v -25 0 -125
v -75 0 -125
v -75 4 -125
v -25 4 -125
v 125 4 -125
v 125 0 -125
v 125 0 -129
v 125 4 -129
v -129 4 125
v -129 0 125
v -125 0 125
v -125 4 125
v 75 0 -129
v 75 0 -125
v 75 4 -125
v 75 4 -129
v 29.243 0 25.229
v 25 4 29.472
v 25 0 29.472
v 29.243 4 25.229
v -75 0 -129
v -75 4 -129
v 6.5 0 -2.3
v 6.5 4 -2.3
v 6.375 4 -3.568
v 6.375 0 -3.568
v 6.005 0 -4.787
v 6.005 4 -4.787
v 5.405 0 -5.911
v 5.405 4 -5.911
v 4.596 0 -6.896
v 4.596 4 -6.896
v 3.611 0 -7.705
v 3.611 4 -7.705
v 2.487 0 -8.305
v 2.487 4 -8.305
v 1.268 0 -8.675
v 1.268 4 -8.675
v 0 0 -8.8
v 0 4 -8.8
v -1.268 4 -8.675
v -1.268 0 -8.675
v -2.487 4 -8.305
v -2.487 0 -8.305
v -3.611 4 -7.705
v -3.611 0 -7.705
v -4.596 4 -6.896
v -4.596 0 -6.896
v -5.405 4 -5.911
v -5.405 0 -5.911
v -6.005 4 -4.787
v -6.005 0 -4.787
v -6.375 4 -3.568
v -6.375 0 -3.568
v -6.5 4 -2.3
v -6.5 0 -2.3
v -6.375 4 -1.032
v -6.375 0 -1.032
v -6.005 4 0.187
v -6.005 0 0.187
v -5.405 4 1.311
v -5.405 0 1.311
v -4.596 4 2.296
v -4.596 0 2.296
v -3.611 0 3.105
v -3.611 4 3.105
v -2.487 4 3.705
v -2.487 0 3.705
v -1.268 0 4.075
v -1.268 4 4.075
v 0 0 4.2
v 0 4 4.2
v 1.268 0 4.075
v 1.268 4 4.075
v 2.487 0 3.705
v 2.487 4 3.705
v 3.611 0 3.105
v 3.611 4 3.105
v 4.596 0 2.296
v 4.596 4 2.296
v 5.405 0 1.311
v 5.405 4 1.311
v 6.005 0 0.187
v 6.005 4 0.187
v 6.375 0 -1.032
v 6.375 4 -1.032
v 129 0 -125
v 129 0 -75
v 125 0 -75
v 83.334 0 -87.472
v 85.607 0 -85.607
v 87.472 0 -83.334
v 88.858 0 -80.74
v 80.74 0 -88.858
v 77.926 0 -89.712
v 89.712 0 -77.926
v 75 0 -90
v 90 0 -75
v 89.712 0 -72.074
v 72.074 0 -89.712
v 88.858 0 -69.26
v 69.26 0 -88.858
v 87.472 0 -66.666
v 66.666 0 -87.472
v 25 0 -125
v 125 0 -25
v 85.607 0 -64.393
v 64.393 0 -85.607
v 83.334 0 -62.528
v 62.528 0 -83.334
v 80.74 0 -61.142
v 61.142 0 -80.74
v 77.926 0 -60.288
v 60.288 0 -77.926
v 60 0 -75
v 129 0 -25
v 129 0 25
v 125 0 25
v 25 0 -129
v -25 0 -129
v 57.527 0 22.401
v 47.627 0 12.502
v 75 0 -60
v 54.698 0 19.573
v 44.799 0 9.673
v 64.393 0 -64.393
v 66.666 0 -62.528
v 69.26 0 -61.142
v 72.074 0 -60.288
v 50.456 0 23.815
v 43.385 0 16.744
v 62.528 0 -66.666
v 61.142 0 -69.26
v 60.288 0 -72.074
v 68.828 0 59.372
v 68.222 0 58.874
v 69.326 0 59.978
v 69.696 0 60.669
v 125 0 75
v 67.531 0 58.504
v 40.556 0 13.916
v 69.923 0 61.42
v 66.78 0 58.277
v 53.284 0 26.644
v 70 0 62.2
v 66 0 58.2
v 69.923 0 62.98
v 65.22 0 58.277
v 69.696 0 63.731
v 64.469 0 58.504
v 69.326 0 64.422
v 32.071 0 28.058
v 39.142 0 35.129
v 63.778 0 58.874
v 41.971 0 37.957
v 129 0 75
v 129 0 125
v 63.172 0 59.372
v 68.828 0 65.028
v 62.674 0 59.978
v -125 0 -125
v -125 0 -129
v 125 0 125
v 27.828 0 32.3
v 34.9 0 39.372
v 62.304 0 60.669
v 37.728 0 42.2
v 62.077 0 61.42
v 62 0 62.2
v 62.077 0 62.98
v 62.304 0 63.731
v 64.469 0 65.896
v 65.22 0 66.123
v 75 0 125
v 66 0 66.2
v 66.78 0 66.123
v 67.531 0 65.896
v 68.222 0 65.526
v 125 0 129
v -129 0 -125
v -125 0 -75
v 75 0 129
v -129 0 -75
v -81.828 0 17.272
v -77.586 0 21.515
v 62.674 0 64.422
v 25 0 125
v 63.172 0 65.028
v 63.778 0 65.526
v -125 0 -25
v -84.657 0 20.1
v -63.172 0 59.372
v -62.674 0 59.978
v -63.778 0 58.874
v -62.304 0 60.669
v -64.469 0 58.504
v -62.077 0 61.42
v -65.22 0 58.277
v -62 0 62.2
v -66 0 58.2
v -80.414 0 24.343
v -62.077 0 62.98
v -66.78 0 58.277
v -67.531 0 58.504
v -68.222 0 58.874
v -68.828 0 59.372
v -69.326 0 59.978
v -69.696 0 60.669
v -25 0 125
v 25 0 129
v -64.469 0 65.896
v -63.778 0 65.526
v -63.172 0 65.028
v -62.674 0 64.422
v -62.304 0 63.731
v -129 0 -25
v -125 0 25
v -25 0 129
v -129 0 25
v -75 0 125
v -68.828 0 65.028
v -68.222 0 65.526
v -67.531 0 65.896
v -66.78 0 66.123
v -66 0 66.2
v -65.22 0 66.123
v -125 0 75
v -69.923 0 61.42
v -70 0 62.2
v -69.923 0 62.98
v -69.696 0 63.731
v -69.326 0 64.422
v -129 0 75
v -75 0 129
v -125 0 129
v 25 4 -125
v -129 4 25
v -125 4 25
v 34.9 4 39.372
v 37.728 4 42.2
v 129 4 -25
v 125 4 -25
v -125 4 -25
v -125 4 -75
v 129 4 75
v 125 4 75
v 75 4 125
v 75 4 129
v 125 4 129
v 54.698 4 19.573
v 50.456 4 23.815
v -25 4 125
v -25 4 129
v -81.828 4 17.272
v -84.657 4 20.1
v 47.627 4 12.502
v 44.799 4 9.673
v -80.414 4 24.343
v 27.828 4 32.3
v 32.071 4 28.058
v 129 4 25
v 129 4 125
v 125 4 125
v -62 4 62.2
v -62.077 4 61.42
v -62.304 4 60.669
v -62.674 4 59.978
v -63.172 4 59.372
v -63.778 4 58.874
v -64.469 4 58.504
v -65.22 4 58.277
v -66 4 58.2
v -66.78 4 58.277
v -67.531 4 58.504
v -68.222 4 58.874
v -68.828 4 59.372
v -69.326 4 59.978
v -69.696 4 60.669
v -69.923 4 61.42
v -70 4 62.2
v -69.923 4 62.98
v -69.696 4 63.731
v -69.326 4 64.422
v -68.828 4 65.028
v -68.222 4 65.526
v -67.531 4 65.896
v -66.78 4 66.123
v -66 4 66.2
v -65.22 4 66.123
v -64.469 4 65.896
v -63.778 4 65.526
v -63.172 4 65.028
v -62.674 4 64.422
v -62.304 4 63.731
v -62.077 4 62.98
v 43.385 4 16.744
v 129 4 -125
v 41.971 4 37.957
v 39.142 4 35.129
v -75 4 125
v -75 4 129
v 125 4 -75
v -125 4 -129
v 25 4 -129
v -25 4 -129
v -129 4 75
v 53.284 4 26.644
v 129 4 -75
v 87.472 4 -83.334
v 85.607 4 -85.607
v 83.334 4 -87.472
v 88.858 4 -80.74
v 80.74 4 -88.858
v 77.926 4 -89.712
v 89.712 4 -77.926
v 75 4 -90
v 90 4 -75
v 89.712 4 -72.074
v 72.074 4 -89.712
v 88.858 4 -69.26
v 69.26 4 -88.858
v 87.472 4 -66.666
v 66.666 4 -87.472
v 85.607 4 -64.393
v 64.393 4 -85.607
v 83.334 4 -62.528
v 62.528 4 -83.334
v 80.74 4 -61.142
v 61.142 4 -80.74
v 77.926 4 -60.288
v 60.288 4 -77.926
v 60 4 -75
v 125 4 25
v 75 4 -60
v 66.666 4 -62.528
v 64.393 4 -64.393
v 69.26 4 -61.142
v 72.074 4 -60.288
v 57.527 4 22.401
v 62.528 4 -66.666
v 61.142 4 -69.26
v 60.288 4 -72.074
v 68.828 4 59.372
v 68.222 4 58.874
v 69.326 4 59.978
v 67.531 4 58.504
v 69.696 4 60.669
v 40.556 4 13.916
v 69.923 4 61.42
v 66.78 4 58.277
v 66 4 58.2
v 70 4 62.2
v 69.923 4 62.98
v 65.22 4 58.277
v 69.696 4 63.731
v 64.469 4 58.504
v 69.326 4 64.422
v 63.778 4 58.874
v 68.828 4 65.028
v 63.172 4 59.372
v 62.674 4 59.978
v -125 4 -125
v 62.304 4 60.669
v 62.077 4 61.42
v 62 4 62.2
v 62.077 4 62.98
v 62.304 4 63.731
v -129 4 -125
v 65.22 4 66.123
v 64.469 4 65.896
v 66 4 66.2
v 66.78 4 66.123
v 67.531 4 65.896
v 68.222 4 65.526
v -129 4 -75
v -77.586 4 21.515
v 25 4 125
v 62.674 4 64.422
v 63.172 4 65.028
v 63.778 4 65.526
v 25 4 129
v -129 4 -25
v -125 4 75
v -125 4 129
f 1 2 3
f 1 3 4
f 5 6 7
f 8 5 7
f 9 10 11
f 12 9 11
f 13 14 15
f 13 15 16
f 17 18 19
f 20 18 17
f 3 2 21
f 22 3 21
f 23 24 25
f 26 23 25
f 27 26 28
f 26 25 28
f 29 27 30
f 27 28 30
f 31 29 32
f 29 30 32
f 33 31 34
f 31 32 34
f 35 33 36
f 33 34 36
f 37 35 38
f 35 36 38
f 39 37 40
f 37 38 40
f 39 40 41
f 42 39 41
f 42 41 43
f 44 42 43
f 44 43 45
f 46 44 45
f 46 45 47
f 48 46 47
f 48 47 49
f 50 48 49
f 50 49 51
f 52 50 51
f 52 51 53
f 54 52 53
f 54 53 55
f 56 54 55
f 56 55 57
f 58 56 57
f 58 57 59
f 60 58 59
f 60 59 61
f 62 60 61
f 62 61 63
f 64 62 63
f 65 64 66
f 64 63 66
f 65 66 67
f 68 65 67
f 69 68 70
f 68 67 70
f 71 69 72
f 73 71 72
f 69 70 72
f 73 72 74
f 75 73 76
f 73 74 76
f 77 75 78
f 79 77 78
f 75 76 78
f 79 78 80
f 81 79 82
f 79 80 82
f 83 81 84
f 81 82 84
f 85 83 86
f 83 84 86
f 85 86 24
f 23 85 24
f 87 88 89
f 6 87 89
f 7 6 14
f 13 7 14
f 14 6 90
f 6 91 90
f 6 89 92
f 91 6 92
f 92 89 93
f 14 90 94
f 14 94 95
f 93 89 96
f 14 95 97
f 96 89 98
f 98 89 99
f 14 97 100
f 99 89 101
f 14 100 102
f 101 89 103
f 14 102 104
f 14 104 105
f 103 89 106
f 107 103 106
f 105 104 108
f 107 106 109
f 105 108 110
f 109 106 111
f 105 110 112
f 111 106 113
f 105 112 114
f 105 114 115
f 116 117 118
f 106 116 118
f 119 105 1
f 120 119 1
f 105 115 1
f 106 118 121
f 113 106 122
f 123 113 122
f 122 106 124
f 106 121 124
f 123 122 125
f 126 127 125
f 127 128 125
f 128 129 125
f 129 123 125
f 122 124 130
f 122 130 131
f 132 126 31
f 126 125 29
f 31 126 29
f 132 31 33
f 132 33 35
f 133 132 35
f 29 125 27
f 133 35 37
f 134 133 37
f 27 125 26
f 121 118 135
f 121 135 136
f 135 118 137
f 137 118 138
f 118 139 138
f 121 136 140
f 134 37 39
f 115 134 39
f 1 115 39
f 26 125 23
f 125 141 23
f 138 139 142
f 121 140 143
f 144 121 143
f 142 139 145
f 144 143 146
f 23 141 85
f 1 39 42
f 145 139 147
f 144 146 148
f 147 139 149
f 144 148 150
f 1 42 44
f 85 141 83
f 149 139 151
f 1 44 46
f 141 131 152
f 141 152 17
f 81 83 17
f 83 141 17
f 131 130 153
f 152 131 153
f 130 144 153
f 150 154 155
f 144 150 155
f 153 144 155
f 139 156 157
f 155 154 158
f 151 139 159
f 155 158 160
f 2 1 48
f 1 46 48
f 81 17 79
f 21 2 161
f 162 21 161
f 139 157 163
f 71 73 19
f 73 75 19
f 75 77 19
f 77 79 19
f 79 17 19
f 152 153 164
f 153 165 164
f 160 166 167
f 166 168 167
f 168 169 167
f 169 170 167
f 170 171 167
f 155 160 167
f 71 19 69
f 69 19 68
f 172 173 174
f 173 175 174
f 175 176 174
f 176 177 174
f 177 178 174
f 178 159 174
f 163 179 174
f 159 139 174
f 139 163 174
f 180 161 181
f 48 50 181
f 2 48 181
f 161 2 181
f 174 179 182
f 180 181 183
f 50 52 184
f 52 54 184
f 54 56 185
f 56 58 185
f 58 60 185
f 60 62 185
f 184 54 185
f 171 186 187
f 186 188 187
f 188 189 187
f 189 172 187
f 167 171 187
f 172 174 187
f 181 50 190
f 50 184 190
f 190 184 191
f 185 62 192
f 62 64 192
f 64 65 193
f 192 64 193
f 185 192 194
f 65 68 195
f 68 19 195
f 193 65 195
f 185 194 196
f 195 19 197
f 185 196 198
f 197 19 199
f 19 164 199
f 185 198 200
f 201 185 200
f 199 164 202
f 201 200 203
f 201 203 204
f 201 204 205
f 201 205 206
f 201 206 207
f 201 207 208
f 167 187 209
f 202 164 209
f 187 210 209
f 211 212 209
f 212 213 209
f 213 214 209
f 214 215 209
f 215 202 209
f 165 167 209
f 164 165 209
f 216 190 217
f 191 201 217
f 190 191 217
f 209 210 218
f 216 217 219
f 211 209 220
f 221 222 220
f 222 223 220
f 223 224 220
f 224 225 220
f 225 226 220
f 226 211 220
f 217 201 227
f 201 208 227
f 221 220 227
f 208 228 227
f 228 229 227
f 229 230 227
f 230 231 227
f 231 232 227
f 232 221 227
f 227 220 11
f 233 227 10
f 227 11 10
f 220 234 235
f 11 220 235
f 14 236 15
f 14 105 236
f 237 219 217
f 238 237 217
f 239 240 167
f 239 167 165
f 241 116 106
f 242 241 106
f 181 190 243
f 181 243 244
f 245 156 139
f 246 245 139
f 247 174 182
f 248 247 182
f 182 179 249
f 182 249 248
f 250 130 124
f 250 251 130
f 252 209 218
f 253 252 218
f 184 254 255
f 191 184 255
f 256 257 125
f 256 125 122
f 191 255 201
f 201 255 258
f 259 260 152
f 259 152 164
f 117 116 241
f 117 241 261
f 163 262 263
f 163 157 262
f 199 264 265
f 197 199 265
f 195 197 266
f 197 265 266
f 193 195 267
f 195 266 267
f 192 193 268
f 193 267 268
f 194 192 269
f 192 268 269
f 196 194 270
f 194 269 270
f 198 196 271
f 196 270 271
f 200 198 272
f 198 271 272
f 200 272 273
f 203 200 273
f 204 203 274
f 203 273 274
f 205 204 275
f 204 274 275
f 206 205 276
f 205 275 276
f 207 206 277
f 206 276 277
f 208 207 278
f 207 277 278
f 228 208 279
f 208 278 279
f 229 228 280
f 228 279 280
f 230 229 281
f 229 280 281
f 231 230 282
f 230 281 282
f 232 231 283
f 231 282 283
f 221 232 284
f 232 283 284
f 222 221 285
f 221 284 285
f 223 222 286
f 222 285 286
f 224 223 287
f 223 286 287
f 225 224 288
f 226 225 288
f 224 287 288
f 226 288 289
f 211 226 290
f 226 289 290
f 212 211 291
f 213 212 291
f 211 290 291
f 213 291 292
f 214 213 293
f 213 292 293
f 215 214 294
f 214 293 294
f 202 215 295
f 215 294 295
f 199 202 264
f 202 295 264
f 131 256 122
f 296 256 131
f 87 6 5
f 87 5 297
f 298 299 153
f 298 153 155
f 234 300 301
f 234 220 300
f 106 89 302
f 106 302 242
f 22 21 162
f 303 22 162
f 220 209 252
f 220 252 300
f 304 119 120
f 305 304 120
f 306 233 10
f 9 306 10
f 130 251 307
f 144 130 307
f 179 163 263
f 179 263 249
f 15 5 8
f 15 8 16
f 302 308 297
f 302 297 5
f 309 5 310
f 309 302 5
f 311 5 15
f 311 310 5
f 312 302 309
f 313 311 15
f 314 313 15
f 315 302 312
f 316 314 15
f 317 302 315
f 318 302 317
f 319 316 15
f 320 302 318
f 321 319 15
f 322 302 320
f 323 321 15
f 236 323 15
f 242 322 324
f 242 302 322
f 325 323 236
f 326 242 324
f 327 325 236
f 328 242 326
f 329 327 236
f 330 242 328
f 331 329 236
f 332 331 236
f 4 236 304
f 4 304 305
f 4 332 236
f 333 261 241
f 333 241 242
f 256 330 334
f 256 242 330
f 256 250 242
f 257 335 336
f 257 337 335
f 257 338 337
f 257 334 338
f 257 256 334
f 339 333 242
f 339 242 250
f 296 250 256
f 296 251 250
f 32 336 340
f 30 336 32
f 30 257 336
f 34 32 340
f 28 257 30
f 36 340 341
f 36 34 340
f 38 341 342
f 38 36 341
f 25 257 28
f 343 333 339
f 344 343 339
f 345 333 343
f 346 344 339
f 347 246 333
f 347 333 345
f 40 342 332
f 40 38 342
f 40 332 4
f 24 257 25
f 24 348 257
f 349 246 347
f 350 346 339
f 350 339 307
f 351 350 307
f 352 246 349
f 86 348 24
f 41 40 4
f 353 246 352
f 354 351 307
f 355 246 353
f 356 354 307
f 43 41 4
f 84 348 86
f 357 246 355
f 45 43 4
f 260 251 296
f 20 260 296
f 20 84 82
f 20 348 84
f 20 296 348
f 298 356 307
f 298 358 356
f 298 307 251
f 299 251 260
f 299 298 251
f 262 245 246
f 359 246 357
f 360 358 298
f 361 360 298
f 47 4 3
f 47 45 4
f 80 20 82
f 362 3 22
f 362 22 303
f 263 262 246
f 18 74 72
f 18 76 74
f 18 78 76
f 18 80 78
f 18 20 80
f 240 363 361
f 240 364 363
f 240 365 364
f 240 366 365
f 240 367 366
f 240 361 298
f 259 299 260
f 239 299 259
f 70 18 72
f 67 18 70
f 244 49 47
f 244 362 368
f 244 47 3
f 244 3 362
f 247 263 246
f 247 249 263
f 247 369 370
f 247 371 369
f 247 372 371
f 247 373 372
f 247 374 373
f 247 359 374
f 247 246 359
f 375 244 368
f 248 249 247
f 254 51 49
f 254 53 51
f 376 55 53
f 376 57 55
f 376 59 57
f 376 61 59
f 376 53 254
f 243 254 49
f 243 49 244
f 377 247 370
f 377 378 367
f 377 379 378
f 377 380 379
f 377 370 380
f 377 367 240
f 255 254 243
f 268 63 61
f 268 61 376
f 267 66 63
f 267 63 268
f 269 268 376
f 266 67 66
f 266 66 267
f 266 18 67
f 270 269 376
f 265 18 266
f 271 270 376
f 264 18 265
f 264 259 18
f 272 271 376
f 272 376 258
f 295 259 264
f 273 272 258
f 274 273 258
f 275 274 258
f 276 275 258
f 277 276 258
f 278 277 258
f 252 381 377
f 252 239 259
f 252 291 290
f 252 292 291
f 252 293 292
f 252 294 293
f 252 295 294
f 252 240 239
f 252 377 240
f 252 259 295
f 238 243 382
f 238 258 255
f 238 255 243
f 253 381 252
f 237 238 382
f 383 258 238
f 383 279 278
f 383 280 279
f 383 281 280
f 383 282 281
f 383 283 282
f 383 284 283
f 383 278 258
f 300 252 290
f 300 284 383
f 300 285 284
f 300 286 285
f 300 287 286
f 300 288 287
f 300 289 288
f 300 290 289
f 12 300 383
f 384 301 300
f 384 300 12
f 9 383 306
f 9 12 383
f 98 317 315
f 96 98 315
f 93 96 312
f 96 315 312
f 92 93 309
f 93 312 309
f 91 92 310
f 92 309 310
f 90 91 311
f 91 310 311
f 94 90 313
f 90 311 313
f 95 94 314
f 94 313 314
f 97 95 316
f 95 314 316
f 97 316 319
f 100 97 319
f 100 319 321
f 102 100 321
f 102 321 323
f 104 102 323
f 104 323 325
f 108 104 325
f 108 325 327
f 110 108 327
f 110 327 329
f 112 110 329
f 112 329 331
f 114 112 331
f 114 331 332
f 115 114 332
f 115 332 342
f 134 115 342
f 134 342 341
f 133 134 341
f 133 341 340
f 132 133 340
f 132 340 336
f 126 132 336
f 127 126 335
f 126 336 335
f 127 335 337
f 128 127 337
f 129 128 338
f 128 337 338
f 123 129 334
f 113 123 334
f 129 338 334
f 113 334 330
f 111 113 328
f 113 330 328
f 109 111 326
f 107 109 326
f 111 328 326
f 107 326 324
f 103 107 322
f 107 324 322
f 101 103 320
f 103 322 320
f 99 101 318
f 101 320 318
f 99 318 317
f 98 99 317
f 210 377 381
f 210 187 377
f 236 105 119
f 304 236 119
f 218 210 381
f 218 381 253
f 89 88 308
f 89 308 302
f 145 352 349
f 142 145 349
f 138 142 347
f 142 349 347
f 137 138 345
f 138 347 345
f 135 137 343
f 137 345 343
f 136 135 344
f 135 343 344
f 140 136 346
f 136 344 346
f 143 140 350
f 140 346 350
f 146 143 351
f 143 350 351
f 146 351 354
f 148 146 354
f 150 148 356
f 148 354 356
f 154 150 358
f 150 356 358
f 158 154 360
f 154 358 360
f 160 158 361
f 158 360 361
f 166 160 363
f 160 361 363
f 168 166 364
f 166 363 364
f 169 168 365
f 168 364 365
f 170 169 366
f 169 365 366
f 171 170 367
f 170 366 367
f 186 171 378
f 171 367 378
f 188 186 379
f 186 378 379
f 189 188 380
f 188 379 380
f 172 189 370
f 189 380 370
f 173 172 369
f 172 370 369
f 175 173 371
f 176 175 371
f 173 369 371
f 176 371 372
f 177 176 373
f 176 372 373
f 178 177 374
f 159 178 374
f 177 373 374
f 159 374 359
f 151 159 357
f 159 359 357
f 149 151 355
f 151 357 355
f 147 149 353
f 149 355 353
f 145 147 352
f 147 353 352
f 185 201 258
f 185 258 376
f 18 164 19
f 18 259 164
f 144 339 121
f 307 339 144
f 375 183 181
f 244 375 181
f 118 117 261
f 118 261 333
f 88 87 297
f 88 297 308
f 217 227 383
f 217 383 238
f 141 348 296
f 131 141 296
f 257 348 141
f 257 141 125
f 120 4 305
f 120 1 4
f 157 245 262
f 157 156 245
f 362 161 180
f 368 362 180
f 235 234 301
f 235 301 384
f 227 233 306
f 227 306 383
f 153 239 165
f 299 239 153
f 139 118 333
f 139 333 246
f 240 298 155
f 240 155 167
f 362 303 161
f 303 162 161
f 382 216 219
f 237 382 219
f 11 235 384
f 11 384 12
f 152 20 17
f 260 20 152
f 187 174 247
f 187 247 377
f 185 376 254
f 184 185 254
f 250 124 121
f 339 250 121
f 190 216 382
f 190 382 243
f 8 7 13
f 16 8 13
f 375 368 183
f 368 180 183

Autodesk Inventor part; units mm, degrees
ref_plane "YZ Plane" through (0, 0, 0) normal (1, 0, 0) x (0, 1, 0)
ref_plane "XZ Plane" through (0, 0, 0) normal (0, 1, 0) x (-1, 0, 0)
ref_plane "XY Plane" through (0, 0, 0) normal (0, 0, 1) x (1, 0, 0)
sketch "Sketch1" plane through (0, 0, 0) normal (0, 1, 0) x (-1, 0, 0)
  line L0 (-125, 125) -> (125, 125)
  line L1 (125, 125) -> (125, -125)
  line L2 (125, -125) -> (-125, -125)
  line L3 (-125, -125) -> (-125, 125)
  line L4 (-125, 125) -> (125, -125) construction
  line L5 (125, 125) -> (-125, -125) construction
  line L6 (125, -125) -> (75, -125)
  line L7 (75, -125) -> (75, -129)
  line L8 (75, -129) -> (125, -129)
  line L9 (125, -129) -> (125, -125)
  line L10 (125, -125) -> (129, -125)
  line L11 (129, -125) -> (129, -75)
  line L12 (129, -75) -> (125, -75)
  line L13 (125, -75) -> (125, -125)
  line L14 (-125, -125) -> (-129, -125)
  line L15 (-129, -125) -> (-129, -75)
  line L16 (-129, -75) -> (-125, -75)
  line L17 (-125, -75) -> (-125, -125)
  line L18 (125, 125) -> (75, 125)
  line L19 (75, 125) -> (75, 129)
  line L20 (75, 129) -> (125, 129)
  line L21 (125, 129) -> (125, 125)
  line L22 (75, -129) -> (75, -125)
  line L23 (75, -125) -> (25, -125)
  line L24 (25, -125) -> (25, -129)
  line L25 (25, -129) -> (75, -129)
  line L26 (25, -129) -> (25, -125)
  line L27 (25, -125) -> (-25, -125)
  line L28 (-25, -125) -> (-25, -129)
  line L29 (-25, -129) -> (25, -129)
  line L30 (-25, -129) -> (-25, -125)
  line L31 (-25, -125) -> (-75, -125)
  line L32 (-75, -125) -> (-75, -129)
  line L33 (-75, -129) -> (-25, -129)
  line L34 (-75, -129) -> (-75, -125)
  line L35 (-75, -125) -> (-125, -125)
  line L36 (-125, -125) -> (-125, -129)
  line L37 (-125, -129) -> (-75, -129)
  line L38 (125, -75) -> (129, -75)
  line L39 (125, -25) -> (125, -75)
  line L40 (129, -25) -> (125, -25)
  line L41 (129, -75) -> (129, -25)
  line L42 (125, -25) -> (129, -25)
  line L43 (125, 25) -> (125, -25)
  line L44 (129, 25) -> (125, 25)
  line L45 (129, -25) -> (129, 25)
  line L46 (125, 25) -> (129, 25)
  line L47 (125, 75) -> (125, 25)
  line L48 (129, 75) -> (125, 75)
  line L49 (129, 25) -> (129, 75)
  line L50 (125, 75) -> (129, 75)
  line L51 (125, 125) -> (125, 75)
  line L52 (129, 125) -> (125, 125)
  line L53 (129, 75) -> (129, 125)
  line L54 (-125, -75) -> (-129, -75)
  line L55 (-129, -75) -> (-129, -25)
  line L56 (-129, -25) -> (-125, -25)
  line L57 (-125, -25) -> (-125, -75)
  line L58 (-125, -25) -> (-129, -25)
  line L59 (-129, -25) -> (-129, 25)
  line L60 (-129, 25) -> (-125, 25)
  line L61 (-125, 25) -> (-125, -25)
  line L62 (-125, 25) -> (-129, 25)
  line L63 (-129, 25) -> (-129, 75)
  line L64 (-129, 75) -> (-125, 75)
  line L65 (-125, 75) -> (-125, 25)
  line L66 (-125, 75) -> (-129, 75)
  line L67 (-129, 75) -> (-129, 125)
  line L68 (-129, 125) -> (-125, 125)
  line L69 (-125, 125) -> (-125, 75)
  line L70 (75, 125) -> (25, 125)
  line L71 (25, 125) -> (25, 129)
  line L72 (25, 129) -> (75, 129)
  line L73 (75, 129) -> (75, 125)
  line L74 (25, 125) -> (-25, 125)
  line L75 (-25, 125) -> (-25, 129)
  line L76 (-25, 129) -> (25, 129)
  line L77 (25, 129) -> (25, 125)
  line L78 (-25, 125) -> (-75, 125)
  line L79 (-75, 125) -> (-75, 129)
  line L80 (-75, 129) -> (-25, 129)
  line L81 (-25, 129) -> (-25, 125)
  line L82 (-75, 125) -> (-125, 125)
  line L83 (-125, 125) -> (-125, 129)
  line L84 (-125, 129) -> (-75, 129)
  line L85 (-75, 129) -> (-75, 125)
  point P0 (0, 0)
  dimension "d0" = 250
  dimension "d1" = 250
  dimension "d2" = 50
  dimension "d3" = 4
  dimension "d4" = 4
  dimension "d5" = 50
  dimension "d6" = 4
  dimension "d7" = 50
  dimension "d8" = 50
  dimension "d9" = 4
  dimension "d12" = 50
  dimension "d19" = 50
  dimension "d26" = 50
  dimension "d33" = 50
extrude "Extrusion1" add sketch "Sketch1" along normal blind 4 contours L83 L84 L79 L0 | L0 L1 L2 L3 | L3 L64 L67 L68 | L75 L76 L71 L0 | L3 L56 L59 L60 | L19 L20 L21 L0 | L3 L14 L15 L16 | L52 L53 L48 L1 | L2 L32 L37 L36 | L44 L45 L40 L1 | L2 L24 L29 L28 | L12 L11 L10 L1 | L2 L9 L8 L7
sketch "Sketch2" plane through (0, 4, 0) normal (0, 1, 0) x (1, 0, 0)
  line L0 (25, -125) -> (75, -125) construction
  circle A0 centre (0, 2.3) radius 6.5
  circle A1 centre (-66, -62.2) radius 4
  circle A2 centre (66, -62.2) radius 4
  line L1 (0, 180.6) -> (0, -180.6) construction
  line L2 (-93.2324, -124) -> (95.467, -124) construction
  line L3 (-129, -125) -> (-125, -125) projected
  line L4 (25, -29.4721) -> (29.2426, -25.2294)
  line L5 (44.799, -9.6731) -> (47.6274, -12.5015)
  line L6 (47.6274, -12.5015) -> (43.3848, -16.7442)
  line L7 (27.8284, -32.3005) -> (25, -29.4721)
  line L8 (34.8995, -39.3716) -> (39.1421, -35.1289)
  line L9 (54.6985, -19.5726) -> (57.5269, -22.401)
  line L10 (57.5269, -22.401) -> (53.2843, -26.6437)
  line L11 (37.7279, -42.2) -> (34.8995, -39.3716)
  line L12 (40.5563, -13.9157) -> (43.3848, -16.7442)
  line L13 (29.2426, -25.2294) -> (32.0711, -28.0579)
  line L14 (39.1421, -35.1289) -> (41.9706, -37.9574)
  line L15 (50.4558, -23.8152) -> (53.2843, -26.6437)
  line L16 (40.5563, -13.9157) -> (44.799, -9.6731)
  line L17 (29.2426, -25.2294) -> (40.5563, -13.9157) construction
  line L18 (43.3848, -16.7442) -> (32.0711, -28.0579) construction
  line L19 (50.4558, -23.8152) -> (54.6985, -19.5726)
  line L20 (53.2843, -26.6437) -> (41.9706, -37.9574) construction
  line L21 (32.0711, -28.0579) -> (27.8284, -32.3005)
  line L22 (39.1421, -35.1289) -> (50.4558, -23.8152) construction
  line L23 (41.9706, -37.9574) -> (37.7279, -42.2)
  point P0 (0, 0)
  point P1 (26.4142, -30.8863)
  dimension "d46" = 13
  dimension "d52" = 8
  dimension "d53" = 132
  dimension "d54" = 61.8
  dimension "d55" = 1
  dimension "d56" = 64.5
  dimension "d57" = 10
  dimension "d58" = 4
  dimension "d59" = 6
  dimension "d60" = 6
  dimension "d61" = 45
  dimension "d62" = 20
  dimension "d63" = 28
  dimension "d64" = 25
extrude "Extrusion2" cut sketch "Sketch2" against normal up to next
sketch "Sketch3" plane through (0, 4, 0) normal (0, 1, 0) x (1, 0, 0)
  point P0 (0, 0)
sketch "Sketch4" plane through (0, 4, 0) normal (0, 1, 0) x (1, 0, 0)
  circle A0 centre (75, 75) radius 15
  line L0 (75, 125) -> (25, 125) projected
  line L1 (125, 25) -> (125, 75) projected
  point P0 (0, 0)
  dimension "d65" = 30
  dimension "d66" = 50
  dimension "d67" = 50
extrude "Extrusion3" cut sketch "Sketch4" against normal blind 10
sketch "Sketch5" plane through (0, 4, 0) normal (0, 1, 0) x (1, 0, 0)
  line L0 (-80.4142, -24.3431) -> (-77.5858, -21.5147)
  line L1 (-77.5858, -21.5147) -> (-81.8284, -17.2721)
  line L2 (-81.8284, -17.2721) -> (-84.6569, -20.1005)
  line L3 (-84.6569, -20.1005) -> (-80.4142, -24.3431)
  line L4 (-79, -30) -> (-71.9289, -22.9289) construction
  line L5 (-83.2426, -18.6863) -> (-79, -22.9289) construction
  line L6 (-79, -22.9289) -> (-75.4645, -26.4645) construction
  line L7 (-75, -125) -> (-25, -125) projected
  line L8 (-125, -25) -> (-125, -75) projected
  point P0 (0, 0)
  dimension "d70" = 45
  dimension "d71" = 6
  dimension "d72" = 4
  dimension "d73" = 10
  dimension "d74" = 5
  dimension "d75" = 46
  dimension "d76" = 95
extrude "Extrusion4" cut sketch "Sketch5" against normal through all
properties part number "FloorPlateTop_V2" material "Wood (Oak)"
